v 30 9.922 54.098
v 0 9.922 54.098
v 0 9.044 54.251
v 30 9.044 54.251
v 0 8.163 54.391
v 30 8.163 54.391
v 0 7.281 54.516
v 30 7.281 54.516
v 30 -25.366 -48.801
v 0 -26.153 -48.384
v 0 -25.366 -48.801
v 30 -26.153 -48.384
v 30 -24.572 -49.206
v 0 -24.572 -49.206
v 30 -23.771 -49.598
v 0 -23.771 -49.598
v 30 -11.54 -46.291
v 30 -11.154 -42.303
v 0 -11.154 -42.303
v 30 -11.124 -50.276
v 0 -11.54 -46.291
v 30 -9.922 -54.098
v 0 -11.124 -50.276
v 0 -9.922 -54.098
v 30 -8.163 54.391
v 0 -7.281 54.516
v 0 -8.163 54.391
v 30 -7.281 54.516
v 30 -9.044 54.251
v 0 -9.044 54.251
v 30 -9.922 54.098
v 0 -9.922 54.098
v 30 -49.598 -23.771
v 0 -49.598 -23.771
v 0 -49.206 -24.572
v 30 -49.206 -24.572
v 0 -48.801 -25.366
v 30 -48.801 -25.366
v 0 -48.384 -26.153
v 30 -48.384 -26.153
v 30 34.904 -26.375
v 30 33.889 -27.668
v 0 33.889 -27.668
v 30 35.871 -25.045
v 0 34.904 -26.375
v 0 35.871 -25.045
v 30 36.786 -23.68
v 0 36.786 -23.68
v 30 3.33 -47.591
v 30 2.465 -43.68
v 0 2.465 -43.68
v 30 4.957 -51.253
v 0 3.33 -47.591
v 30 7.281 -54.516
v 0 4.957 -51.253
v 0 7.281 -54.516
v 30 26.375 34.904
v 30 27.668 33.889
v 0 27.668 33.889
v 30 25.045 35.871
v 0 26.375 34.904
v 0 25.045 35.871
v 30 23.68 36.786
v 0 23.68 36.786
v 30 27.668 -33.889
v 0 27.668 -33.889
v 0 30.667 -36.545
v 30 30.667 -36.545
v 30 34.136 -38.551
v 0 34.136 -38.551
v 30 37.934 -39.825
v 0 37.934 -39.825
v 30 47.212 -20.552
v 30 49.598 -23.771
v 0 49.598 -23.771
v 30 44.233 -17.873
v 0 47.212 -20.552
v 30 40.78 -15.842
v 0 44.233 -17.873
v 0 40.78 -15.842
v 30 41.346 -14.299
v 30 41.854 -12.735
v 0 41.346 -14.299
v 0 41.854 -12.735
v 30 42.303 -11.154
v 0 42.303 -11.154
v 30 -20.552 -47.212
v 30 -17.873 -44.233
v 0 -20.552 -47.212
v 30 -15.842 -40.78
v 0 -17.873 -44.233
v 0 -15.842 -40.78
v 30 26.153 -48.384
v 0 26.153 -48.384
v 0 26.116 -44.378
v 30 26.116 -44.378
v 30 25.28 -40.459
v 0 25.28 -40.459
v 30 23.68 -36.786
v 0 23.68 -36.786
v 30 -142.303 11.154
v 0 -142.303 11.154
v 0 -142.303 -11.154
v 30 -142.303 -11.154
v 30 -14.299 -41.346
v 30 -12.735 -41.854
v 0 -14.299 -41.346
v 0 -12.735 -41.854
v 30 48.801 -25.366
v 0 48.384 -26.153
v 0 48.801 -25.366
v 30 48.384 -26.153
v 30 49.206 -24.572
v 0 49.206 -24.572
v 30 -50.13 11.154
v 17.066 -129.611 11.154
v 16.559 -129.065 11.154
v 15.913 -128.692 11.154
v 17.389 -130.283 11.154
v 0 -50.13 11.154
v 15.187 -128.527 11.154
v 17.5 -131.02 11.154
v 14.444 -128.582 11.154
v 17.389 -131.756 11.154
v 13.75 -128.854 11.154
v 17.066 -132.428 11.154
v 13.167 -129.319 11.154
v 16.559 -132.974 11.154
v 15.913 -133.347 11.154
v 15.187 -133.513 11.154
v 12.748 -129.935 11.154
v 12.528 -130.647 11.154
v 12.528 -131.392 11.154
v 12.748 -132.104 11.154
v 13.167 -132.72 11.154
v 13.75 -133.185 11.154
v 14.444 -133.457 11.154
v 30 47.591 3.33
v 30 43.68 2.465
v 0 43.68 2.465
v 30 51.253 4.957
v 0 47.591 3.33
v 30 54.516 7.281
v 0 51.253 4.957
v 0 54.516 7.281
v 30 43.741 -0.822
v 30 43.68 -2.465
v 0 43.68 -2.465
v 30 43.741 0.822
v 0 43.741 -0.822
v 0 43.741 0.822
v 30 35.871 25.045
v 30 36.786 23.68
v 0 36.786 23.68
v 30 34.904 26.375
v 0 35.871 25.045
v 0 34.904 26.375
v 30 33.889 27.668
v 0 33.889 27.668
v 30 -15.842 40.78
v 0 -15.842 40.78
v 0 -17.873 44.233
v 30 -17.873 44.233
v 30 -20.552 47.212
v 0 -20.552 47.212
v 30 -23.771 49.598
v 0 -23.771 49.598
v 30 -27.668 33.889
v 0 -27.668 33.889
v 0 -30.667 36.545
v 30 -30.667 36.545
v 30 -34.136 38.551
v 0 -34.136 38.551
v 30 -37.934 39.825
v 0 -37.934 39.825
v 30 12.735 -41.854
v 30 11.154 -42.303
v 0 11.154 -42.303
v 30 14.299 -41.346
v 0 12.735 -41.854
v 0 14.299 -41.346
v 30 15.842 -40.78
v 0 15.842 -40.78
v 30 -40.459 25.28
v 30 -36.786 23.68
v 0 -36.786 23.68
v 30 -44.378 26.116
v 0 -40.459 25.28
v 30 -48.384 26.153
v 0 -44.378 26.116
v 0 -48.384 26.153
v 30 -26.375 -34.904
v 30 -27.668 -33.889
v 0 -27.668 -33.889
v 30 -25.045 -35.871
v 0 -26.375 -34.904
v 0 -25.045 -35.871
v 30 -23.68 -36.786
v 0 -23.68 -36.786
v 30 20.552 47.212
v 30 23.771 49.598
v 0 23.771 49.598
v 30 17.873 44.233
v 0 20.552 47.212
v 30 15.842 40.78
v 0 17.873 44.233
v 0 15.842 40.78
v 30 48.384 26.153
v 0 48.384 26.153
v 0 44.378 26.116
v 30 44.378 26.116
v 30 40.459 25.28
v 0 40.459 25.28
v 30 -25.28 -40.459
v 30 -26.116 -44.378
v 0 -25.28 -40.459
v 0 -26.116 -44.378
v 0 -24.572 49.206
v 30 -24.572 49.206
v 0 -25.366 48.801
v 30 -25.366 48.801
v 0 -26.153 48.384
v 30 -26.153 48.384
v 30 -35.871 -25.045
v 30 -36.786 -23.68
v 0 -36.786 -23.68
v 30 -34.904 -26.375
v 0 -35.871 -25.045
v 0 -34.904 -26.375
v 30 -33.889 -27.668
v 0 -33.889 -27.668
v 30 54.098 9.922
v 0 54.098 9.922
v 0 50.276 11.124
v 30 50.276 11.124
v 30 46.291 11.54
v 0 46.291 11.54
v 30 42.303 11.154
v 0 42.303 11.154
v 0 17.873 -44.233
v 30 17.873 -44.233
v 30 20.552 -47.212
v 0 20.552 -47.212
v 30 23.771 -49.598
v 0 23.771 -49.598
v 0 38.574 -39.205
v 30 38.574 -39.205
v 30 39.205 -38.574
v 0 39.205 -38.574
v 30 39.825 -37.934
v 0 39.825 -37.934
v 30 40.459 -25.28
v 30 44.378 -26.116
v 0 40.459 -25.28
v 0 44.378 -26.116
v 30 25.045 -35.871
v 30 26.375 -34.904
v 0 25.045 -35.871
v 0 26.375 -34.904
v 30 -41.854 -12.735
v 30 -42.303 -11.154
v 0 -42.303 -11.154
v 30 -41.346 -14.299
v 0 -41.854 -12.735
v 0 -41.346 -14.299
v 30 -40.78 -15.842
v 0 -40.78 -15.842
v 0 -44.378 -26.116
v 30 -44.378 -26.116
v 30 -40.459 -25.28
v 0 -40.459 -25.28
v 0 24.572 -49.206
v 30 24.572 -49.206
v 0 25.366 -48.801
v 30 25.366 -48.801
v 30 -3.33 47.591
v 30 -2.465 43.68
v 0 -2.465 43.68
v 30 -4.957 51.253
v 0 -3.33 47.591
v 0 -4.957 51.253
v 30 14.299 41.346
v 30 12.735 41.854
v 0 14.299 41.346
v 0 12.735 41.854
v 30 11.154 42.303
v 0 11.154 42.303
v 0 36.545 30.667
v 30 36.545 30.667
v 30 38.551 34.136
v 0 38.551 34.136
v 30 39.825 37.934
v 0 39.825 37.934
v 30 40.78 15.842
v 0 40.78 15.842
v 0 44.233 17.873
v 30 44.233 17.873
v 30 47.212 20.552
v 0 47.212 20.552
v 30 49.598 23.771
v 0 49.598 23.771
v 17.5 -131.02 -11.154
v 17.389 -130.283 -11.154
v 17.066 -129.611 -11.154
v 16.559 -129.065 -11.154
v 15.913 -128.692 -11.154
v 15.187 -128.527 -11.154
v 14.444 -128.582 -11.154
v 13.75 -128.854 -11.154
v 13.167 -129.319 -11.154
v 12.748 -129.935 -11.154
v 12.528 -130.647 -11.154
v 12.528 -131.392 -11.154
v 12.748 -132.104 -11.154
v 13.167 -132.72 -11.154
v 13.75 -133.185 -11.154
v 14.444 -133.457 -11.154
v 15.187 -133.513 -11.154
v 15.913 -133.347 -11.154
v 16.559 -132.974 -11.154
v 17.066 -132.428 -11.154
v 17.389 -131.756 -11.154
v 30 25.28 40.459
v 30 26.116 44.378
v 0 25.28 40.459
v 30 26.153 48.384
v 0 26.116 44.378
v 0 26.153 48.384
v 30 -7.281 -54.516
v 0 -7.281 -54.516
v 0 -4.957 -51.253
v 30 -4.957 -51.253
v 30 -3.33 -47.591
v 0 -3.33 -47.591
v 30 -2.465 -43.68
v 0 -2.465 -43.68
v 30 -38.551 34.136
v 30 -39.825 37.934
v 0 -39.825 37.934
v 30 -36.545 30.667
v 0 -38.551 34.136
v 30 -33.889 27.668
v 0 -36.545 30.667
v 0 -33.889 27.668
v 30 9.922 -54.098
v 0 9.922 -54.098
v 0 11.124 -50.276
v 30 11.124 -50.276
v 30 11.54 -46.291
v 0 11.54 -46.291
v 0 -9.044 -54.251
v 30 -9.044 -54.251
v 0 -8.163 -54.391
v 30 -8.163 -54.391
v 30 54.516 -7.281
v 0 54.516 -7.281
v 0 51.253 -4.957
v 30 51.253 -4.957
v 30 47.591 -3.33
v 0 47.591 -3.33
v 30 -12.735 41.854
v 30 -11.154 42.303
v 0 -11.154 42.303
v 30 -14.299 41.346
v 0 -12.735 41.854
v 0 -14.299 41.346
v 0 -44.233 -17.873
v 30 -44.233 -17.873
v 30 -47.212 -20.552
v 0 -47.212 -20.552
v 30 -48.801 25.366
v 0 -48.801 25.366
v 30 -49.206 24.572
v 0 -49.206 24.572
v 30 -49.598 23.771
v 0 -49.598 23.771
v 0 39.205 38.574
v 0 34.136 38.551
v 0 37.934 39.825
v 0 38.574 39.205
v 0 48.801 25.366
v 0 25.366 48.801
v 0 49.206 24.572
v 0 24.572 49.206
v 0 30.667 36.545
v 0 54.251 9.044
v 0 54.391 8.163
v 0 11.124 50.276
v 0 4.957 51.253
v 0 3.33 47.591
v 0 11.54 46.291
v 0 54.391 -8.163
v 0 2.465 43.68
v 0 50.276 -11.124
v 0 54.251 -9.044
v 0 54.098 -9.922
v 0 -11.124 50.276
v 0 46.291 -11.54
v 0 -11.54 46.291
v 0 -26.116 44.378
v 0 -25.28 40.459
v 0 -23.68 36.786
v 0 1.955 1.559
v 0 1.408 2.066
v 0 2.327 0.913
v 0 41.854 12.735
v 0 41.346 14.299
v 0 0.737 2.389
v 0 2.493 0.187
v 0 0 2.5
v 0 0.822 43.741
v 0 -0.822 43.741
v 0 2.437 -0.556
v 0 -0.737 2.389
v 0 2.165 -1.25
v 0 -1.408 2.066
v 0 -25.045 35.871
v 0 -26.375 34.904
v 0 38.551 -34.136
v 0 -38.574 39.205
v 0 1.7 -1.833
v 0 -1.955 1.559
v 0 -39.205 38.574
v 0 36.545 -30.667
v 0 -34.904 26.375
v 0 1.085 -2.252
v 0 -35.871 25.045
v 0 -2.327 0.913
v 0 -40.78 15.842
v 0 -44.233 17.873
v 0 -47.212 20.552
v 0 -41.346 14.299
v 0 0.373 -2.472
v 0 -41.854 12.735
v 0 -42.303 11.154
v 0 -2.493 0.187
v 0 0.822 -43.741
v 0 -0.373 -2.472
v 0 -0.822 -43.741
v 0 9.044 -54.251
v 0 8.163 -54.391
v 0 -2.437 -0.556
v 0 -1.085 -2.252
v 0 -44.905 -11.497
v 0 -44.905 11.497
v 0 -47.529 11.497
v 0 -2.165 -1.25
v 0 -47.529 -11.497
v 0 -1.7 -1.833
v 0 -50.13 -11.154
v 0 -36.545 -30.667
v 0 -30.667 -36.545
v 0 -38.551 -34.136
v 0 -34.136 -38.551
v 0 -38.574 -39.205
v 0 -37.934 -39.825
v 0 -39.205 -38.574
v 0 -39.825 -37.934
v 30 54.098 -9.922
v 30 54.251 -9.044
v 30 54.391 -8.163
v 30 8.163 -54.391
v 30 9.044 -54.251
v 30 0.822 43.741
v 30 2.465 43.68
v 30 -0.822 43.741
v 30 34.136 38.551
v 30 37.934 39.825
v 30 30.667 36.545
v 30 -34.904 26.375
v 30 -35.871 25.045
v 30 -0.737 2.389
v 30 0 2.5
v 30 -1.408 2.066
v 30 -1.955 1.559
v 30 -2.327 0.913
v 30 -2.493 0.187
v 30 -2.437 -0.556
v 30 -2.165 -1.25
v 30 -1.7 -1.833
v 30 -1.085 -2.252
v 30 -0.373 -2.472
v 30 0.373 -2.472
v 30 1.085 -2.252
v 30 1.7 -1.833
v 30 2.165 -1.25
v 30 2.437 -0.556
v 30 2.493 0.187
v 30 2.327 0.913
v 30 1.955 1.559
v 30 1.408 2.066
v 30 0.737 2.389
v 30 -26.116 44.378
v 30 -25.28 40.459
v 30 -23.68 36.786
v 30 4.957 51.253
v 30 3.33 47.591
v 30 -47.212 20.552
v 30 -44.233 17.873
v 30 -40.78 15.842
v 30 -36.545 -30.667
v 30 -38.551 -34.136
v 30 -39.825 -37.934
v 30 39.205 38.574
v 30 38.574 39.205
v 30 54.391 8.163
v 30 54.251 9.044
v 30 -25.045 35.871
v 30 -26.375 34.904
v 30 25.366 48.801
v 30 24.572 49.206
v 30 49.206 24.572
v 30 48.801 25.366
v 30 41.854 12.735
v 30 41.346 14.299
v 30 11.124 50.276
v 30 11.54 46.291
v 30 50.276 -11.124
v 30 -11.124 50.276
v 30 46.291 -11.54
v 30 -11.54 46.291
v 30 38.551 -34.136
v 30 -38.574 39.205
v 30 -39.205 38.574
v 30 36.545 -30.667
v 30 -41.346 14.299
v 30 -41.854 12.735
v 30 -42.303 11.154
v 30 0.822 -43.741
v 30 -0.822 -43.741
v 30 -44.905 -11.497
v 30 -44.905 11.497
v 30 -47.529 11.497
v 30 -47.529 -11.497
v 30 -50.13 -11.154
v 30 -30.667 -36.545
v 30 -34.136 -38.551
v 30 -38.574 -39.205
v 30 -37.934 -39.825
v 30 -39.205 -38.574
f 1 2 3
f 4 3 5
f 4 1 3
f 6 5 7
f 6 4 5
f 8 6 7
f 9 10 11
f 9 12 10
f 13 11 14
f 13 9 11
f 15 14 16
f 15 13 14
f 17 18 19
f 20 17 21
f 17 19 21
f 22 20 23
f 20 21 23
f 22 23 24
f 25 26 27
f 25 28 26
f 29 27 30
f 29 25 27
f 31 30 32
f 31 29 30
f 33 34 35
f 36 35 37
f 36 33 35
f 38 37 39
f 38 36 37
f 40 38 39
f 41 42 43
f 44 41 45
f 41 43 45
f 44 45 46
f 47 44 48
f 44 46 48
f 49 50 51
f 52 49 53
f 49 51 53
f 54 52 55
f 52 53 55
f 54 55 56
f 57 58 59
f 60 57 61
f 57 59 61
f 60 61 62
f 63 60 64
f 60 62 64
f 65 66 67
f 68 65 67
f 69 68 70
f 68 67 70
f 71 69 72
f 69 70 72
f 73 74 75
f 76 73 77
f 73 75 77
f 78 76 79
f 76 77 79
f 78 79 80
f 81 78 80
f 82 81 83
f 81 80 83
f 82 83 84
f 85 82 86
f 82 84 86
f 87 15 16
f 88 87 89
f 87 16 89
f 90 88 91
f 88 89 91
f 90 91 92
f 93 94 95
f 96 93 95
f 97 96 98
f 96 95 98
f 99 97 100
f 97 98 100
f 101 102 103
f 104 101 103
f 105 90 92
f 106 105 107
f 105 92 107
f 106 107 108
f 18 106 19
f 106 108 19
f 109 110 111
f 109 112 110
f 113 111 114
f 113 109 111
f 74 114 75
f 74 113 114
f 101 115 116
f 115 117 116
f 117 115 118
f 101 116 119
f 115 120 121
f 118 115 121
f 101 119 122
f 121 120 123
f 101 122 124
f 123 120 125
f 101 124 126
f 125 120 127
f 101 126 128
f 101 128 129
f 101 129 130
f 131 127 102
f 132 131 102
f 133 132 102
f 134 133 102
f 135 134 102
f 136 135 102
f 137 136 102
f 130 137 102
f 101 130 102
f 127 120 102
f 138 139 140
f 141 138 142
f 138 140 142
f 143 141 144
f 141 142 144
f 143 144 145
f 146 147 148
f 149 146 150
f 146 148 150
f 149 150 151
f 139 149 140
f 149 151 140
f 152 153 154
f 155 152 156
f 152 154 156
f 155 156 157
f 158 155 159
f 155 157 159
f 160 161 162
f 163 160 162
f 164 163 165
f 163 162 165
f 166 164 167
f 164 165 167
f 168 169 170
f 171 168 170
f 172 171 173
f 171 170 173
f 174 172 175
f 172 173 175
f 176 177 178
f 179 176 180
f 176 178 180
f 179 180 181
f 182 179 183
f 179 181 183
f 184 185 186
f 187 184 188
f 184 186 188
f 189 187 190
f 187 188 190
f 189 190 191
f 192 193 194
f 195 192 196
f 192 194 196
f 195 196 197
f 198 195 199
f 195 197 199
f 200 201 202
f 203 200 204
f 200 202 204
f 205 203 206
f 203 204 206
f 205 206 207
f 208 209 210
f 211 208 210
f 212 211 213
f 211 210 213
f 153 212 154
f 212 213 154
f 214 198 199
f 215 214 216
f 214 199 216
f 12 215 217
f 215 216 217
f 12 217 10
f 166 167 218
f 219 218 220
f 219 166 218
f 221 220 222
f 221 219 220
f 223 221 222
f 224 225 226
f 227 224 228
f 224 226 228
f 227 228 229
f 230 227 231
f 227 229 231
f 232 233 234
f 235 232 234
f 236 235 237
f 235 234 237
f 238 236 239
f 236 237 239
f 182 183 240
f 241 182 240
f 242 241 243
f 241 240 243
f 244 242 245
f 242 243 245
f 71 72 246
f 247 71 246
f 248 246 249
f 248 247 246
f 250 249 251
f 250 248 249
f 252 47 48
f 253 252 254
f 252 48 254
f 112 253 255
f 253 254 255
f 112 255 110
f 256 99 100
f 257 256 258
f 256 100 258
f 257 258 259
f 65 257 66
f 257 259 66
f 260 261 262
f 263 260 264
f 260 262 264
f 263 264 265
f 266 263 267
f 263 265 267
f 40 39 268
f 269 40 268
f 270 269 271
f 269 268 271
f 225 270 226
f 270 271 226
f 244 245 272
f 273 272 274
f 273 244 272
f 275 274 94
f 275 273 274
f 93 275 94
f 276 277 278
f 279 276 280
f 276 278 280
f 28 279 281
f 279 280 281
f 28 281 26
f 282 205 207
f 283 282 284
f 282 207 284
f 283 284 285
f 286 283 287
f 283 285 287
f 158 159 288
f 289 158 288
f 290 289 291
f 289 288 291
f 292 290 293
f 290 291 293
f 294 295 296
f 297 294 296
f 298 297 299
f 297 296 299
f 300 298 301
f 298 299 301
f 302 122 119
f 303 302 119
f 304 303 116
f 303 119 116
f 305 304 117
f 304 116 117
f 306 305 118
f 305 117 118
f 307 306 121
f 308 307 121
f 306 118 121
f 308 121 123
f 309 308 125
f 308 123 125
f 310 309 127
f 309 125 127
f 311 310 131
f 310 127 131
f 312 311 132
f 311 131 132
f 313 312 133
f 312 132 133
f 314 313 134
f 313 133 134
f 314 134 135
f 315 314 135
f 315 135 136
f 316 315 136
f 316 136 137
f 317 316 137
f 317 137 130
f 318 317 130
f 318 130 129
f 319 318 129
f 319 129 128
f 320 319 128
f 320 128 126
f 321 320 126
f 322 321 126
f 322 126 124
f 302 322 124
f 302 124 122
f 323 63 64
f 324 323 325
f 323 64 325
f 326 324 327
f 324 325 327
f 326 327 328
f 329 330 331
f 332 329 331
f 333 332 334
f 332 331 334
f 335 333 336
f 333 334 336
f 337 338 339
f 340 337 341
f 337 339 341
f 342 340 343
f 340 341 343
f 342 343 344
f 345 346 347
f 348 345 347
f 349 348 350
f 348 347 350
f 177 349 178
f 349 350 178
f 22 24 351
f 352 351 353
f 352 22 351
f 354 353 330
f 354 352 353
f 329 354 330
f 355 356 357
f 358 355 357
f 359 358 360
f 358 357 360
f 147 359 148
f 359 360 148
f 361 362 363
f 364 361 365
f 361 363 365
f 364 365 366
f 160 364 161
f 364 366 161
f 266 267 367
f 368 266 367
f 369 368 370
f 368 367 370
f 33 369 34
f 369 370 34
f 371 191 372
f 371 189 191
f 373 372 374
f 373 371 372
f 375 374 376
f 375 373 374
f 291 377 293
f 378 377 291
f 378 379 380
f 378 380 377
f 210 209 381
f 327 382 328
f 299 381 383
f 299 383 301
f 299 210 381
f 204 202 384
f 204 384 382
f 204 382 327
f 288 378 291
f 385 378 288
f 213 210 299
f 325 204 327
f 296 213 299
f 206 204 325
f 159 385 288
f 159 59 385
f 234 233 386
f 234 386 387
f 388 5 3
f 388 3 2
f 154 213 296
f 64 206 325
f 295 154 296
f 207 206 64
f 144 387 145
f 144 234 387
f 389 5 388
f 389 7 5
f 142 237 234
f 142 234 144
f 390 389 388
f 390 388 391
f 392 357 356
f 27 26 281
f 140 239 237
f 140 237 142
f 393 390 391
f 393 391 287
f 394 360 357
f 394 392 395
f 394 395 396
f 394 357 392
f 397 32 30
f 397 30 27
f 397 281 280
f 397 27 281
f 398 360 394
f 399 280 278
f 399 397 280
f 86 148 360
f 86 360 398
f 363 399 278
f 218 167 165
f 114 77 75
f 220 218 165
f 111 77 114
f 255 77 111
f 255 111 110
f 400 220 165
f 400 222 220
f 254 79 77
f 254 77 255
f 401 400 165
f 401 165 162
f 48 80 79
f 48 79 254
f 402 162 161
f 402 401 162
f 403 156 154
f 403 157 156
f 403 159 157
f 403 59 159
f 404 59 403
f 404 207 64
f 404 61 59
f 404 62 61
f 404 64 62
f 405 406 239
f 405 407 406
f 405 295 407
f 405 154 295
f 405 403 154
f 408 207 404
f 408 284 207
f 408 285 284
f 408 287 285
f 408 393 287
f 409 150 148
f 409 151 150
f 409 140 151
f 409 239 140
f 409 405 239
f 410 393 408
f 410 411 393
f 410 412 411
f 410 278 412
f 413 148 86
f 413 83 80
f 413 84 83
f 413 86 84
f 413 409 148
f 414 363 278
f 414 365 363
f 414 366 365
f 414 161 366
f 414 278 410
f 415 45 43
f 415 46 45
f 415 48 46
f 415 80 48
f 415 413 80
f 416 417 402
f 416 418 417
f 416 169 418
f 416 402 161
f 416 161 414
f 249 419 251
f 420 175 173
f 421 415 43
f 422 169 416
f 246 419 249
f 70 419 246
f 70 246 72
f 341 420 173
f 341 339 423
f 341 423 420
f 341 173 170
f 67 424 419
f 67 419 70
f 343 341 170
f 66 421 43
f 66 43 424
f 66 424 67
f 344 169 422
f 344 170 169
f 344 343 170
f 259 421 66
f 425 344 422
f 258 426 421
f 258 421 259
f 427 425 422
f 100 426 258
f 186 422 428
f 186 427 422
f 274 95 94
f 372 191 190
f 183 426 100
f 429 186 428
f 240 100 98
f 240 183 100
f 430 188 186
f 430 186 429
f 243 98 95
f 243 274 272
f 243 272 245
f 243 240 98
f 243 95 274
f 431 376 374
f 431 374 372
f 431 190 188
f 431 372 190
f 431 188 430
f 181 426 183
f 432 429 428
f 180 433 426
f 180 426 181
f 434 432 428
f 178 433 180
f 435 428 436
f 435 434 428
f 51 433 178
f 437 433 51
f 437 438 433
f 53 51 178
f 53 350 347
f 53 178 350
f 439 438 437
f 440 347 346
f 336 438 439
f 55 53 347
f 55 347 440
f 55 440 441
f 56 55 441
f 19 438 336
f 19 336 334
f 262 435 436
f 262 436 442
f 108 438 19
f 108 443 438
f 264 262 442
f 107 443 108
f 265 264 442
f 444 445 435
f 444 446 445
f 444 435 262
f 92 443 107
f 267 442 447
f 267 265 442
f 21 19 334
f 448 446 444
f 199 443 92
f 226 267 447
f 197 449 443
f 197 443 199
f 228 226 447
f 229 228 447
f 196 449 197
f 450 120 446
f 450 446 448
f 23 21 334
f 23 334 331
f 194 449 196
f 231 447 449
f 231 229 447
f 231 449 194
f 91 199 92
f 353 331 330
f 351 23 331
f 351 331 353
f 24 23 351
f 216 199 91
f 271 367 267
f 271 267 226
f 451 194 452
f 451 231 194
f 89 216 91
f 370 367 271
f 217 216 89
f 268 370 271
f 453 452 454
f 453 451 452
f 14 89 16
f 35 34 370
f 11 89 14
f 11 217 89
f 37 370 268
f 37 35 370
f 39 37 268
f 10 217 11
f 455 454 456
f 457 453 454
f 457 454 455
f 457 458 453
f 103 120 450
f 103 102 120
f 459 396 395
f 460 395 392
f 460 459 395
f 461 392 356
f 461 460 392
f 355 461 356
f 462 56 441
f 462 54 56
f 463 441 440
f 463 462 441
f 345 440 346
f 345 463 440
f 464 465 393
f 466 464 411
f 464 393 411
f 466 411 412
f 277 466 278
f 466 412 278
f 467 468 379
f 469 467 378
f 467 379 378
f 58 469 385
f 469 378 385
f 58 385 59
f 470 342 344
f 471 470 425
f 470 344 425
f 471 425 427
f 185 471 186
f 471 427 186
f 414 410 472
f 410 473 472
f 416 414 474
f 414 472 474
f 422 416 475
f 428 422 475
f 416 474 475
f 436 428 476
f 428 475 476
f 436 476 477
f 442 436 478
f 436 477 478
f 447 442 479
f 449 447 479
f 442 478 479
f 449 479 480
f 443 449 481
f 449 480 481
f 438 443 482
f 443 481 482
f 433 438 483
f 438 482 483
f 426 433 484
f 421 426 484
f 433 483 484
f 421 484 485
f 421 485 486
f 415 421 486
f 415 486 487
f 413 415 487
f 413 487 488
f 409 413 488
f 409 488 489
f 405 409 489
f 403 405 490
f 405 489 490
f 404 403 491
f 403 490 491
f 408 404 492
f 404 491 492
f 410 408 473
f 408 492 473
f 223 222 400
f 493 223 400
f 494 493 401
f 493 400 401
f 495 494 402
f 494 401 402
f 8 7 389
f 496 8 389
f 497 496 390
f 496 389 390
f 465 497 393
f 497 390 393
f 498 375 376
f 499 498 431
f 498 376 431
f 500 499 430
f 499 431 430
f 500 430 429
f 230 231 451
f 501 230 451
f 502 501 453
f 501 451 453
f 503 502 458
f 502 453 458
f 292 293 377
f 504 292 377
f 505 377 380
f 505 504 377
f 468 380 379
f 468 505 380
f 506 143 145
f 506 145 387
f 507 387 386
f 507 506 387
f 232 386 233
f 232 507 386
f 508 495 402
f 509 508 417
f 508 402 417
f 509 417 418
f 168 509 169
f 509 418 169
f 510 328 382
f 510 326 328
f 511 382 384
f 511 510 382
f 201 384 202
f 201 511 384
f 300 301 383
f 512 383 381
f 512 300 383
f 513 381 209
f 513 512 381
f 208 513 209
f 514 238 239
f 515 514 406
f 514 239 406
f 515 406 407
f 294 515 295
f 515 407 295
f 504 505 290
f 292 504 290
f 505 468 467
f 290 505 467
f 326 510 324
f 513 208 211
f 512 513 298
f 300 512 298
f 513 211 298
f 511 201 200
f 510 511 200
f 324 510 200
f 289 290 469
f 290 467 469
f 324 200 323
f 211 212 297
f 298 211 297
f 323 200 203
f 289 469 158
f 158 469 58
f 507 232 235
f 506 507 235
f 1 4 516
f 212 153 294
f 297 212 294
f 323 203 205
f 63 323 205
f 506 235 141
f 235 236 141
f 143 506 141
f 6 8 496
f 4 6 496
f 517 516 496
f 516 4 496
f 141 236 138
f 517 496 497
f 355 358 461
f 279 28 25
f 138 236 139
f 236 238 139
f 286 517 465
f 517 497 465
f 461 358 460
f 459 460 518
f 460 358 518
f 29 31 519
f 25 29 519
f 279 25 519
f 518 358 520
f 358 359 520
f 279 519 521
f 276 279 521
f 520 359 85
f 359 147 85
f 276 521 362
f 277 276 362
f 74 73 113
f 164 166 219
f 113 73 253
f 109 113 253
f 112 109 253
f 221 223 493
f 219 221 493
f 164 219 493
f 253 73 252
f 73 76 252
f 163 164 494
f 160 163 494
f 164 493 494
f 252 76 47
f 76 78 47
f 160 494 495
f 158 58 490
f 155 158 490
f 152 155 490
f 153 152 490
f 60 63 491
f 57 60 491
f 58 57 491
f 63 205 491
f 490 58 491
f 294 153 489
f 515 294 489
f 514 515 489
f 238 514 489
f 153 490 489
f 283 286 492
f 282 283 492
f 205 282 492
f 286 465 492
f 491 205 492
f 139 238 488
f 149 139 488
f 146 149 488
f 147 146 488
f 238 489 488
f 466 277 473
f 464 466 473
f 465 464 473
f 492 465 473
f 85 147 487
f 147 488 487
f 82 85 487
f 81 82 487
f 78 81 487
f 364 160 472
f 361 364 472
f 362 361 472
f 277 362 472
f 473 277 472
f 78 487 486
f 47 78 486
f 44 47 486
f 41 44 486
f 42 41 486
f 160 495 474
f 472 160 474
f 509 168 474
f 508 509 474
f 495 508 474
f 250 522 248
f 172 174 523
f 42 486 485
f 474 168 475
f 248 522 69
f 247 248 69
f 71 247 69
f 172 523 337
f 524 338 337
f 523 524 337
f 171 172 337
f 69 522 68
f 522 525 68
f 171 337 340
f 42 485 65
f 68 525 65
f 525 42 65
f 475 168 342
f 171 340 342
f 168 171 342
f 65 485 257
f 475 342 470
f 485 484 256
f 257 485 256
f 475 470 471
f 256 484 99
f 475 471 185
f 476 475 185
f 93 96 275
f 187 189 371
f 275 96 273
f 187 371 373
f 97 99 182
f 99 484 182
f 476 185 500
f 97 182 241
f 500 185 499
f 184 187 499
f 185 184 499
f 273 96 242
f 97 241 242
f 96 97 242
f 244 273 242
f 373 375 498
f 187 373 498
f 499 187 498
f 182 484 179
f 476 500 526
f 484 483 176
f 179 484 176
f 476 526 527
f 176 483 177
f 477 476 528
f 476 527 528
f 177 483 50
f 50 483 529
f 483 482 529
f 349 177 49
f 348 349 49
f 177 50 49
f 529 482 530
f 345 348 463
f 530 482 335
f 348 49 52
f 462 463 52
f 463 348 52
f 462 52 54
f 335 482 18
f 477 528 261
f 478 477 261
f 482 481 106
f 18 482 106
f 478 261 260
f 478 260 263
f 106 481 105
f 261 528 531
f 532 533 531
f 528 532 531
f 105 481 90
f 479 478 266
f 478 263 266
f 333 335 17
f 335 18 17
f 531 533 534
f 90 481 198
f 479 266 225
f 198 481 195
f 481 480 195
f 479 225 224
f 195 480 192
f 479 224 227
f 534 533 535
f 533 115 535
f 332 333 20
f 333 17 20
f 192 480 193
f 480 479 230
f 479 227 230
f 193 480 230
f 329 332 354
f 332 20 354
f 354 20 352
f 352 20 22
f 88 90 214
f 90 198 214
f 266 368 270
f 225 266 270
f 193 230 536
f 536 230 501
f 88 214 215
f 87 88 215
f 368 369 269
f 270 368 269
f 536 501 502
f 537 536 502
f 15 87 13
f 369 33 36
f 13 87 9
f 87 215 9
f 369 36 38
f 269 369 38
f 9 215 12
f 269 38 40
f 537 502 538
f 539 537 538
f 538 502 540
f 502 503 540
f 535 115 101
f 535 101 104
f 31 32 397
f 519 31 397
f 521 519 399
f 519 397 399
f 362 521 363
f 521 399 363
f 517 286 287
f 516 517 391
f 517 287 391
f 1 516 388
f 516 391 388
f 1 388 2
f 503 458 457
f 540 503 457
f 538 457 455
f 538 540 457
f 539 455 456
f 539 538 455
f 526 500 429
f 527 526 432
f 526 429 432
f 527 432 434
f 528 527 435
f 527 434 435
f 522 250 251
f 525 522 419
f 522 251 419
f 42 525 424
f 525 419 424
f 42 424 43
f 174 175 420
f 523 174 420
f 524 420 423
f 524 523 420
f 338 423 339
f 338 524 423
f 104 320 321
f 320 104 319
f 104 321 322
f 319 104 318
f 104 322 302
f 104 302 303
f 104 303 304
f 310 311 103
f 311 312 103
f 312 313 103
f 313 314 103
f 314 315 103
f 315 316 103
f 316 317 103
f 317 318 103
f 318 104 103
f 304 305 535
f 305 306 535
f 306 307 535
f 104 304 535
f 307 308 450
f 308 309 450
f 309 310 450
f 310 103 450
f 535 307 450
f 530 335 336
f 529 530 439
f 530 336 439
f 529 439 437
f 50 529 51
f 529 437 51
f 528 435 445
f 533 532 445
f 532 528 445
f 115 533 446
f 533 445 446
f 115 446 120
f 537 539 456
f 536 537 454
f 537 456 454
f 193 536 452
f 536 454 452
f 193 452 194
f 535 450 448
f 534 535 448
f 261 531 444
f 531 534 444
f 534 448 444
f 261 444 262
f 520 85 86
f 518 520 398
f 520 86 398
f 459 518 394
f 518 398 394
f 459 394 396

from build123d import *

# Parameters (mm, degrees)
BASPROSKE_W         = 30
BASPROSKE_H         = 55
TOOTHCUT_DEPTH      = 84.366660003
TEETHCUTS_COUNT     = 20
BORSKE_R            = 2.5
BORE_DEPTH          = 50.0000508
EXTRUDE_START       = -30
EXTRUDE_1_DEPTH     = 30
SKETCH_7_R          = 2.5
CUT_EXTRUDE_1_DEPTH = 160.570441323


with BuildPart() as part:
    # BasProSke → Base-Revolve (revolve)
    with BuildSketch(Plane(origin=(0, 0, 0), x_dir=(1, 0, 0), z_dir=(0, 1, 0)), mode=Mode.PRIVATE) as base_revolve_sk:
        with Locations((15, 27.5)):
            Rectangle(BASPROSKE_W, BASPROSKE_H)
    revolve(base_revolve_sk.sketch.rotate(Axis((-10, 0, 0), (1, 0, 0)), 180), axis=Axis((-10, 0, 0), (1, 0, 0)))

    # TooCutSke → ToothCut (cut, through all)
    with BuildSketch(Plane(origin=(0, 0, 0), x_dir=(0, 0, -1), z_dir=(1, 0, 0))):
        with BuildLine():
            ThreePointArc((2.464838288, 43.679509764), (0, 43.749), (-2.464838288, 43.679509764))
            ThreePointArc((-2.464838288, 43.679509764), (-4.057398861, 49.476814676), (-7.300899231, 54.538899105))
            ThreePointArc((-7.300899231, 54.538899105), (0, 55.0254), (7.300899231, 54.538899105))
            ThreePointArc((7.300899231, 54.538899105), (4.057398861, 49.476814676), (2.464838288, 43.679509764))
        make_face()
    toothcut = extrude(amount=TOOTHCUT_DEPTH, mode=Mode.SUBTRACT)

    # TeethCuts: ToothCut ×20 about axis
    teethcuts_axis = Axis((0, 0, 0), (1, 0, 0))
    for i in range(1, TEETHCUTS_COUNT):
        add(toothcut.rotate(teethcuts_axis, i * 360 / TEETHCUTS_COUNT), mode=Mode.SUBTRACT)

    # BorSke → Bore (cut, symmetric)
    with BuildSketch(Plane(origin=(0, 0, 0), x_dir=(0, 0, -1), z_dir=(1, 0, 0))):
        with Locations(Location((0, 0, 0), (0, 0, 180))):
            Circle(BORSKE_R)
    extrude(amount=BORE_DEPTH, both=True, mode=Mode.SUBTRACT)

    # 草图6 → 凸台-拉伸1 (add)
    with BuildSketch(Plane(origin=(30, 0, 0), x_dir=(0, 0, -1), z_dir=(1, 0, 0)).offset(EXTRUDE_START)):
        with BuildLine():
            Line((-11.153510308, -42.303359309), (-11.153510308, -142.303359309))
            Line((-11.153510308, -142.303359309), (11.153510308, -142.303359309))
            Line((11.153510308, -142.303359309), (11.153510308, -42.303359309))
            ThreePointArc((11.153510308, -42.303359309), (0, -43.749), (-11.153510308, -42.303359309))
        make_face()
    extrude(amount=EXTRUDE_1_DEPTH)

    # 草图7 → 切除-拉伸1 (cut, through all)
    with BuildSketch(Plane.XY.offset(11.153510308)):
        with Locations((15, -131.019533407)):
            Circle(SKETCH_7_R)
    extrude(amount=-CUT_EXTRUDE_1_DEPTH, mode=Mode.SUBTRACT)


solid = part.part
